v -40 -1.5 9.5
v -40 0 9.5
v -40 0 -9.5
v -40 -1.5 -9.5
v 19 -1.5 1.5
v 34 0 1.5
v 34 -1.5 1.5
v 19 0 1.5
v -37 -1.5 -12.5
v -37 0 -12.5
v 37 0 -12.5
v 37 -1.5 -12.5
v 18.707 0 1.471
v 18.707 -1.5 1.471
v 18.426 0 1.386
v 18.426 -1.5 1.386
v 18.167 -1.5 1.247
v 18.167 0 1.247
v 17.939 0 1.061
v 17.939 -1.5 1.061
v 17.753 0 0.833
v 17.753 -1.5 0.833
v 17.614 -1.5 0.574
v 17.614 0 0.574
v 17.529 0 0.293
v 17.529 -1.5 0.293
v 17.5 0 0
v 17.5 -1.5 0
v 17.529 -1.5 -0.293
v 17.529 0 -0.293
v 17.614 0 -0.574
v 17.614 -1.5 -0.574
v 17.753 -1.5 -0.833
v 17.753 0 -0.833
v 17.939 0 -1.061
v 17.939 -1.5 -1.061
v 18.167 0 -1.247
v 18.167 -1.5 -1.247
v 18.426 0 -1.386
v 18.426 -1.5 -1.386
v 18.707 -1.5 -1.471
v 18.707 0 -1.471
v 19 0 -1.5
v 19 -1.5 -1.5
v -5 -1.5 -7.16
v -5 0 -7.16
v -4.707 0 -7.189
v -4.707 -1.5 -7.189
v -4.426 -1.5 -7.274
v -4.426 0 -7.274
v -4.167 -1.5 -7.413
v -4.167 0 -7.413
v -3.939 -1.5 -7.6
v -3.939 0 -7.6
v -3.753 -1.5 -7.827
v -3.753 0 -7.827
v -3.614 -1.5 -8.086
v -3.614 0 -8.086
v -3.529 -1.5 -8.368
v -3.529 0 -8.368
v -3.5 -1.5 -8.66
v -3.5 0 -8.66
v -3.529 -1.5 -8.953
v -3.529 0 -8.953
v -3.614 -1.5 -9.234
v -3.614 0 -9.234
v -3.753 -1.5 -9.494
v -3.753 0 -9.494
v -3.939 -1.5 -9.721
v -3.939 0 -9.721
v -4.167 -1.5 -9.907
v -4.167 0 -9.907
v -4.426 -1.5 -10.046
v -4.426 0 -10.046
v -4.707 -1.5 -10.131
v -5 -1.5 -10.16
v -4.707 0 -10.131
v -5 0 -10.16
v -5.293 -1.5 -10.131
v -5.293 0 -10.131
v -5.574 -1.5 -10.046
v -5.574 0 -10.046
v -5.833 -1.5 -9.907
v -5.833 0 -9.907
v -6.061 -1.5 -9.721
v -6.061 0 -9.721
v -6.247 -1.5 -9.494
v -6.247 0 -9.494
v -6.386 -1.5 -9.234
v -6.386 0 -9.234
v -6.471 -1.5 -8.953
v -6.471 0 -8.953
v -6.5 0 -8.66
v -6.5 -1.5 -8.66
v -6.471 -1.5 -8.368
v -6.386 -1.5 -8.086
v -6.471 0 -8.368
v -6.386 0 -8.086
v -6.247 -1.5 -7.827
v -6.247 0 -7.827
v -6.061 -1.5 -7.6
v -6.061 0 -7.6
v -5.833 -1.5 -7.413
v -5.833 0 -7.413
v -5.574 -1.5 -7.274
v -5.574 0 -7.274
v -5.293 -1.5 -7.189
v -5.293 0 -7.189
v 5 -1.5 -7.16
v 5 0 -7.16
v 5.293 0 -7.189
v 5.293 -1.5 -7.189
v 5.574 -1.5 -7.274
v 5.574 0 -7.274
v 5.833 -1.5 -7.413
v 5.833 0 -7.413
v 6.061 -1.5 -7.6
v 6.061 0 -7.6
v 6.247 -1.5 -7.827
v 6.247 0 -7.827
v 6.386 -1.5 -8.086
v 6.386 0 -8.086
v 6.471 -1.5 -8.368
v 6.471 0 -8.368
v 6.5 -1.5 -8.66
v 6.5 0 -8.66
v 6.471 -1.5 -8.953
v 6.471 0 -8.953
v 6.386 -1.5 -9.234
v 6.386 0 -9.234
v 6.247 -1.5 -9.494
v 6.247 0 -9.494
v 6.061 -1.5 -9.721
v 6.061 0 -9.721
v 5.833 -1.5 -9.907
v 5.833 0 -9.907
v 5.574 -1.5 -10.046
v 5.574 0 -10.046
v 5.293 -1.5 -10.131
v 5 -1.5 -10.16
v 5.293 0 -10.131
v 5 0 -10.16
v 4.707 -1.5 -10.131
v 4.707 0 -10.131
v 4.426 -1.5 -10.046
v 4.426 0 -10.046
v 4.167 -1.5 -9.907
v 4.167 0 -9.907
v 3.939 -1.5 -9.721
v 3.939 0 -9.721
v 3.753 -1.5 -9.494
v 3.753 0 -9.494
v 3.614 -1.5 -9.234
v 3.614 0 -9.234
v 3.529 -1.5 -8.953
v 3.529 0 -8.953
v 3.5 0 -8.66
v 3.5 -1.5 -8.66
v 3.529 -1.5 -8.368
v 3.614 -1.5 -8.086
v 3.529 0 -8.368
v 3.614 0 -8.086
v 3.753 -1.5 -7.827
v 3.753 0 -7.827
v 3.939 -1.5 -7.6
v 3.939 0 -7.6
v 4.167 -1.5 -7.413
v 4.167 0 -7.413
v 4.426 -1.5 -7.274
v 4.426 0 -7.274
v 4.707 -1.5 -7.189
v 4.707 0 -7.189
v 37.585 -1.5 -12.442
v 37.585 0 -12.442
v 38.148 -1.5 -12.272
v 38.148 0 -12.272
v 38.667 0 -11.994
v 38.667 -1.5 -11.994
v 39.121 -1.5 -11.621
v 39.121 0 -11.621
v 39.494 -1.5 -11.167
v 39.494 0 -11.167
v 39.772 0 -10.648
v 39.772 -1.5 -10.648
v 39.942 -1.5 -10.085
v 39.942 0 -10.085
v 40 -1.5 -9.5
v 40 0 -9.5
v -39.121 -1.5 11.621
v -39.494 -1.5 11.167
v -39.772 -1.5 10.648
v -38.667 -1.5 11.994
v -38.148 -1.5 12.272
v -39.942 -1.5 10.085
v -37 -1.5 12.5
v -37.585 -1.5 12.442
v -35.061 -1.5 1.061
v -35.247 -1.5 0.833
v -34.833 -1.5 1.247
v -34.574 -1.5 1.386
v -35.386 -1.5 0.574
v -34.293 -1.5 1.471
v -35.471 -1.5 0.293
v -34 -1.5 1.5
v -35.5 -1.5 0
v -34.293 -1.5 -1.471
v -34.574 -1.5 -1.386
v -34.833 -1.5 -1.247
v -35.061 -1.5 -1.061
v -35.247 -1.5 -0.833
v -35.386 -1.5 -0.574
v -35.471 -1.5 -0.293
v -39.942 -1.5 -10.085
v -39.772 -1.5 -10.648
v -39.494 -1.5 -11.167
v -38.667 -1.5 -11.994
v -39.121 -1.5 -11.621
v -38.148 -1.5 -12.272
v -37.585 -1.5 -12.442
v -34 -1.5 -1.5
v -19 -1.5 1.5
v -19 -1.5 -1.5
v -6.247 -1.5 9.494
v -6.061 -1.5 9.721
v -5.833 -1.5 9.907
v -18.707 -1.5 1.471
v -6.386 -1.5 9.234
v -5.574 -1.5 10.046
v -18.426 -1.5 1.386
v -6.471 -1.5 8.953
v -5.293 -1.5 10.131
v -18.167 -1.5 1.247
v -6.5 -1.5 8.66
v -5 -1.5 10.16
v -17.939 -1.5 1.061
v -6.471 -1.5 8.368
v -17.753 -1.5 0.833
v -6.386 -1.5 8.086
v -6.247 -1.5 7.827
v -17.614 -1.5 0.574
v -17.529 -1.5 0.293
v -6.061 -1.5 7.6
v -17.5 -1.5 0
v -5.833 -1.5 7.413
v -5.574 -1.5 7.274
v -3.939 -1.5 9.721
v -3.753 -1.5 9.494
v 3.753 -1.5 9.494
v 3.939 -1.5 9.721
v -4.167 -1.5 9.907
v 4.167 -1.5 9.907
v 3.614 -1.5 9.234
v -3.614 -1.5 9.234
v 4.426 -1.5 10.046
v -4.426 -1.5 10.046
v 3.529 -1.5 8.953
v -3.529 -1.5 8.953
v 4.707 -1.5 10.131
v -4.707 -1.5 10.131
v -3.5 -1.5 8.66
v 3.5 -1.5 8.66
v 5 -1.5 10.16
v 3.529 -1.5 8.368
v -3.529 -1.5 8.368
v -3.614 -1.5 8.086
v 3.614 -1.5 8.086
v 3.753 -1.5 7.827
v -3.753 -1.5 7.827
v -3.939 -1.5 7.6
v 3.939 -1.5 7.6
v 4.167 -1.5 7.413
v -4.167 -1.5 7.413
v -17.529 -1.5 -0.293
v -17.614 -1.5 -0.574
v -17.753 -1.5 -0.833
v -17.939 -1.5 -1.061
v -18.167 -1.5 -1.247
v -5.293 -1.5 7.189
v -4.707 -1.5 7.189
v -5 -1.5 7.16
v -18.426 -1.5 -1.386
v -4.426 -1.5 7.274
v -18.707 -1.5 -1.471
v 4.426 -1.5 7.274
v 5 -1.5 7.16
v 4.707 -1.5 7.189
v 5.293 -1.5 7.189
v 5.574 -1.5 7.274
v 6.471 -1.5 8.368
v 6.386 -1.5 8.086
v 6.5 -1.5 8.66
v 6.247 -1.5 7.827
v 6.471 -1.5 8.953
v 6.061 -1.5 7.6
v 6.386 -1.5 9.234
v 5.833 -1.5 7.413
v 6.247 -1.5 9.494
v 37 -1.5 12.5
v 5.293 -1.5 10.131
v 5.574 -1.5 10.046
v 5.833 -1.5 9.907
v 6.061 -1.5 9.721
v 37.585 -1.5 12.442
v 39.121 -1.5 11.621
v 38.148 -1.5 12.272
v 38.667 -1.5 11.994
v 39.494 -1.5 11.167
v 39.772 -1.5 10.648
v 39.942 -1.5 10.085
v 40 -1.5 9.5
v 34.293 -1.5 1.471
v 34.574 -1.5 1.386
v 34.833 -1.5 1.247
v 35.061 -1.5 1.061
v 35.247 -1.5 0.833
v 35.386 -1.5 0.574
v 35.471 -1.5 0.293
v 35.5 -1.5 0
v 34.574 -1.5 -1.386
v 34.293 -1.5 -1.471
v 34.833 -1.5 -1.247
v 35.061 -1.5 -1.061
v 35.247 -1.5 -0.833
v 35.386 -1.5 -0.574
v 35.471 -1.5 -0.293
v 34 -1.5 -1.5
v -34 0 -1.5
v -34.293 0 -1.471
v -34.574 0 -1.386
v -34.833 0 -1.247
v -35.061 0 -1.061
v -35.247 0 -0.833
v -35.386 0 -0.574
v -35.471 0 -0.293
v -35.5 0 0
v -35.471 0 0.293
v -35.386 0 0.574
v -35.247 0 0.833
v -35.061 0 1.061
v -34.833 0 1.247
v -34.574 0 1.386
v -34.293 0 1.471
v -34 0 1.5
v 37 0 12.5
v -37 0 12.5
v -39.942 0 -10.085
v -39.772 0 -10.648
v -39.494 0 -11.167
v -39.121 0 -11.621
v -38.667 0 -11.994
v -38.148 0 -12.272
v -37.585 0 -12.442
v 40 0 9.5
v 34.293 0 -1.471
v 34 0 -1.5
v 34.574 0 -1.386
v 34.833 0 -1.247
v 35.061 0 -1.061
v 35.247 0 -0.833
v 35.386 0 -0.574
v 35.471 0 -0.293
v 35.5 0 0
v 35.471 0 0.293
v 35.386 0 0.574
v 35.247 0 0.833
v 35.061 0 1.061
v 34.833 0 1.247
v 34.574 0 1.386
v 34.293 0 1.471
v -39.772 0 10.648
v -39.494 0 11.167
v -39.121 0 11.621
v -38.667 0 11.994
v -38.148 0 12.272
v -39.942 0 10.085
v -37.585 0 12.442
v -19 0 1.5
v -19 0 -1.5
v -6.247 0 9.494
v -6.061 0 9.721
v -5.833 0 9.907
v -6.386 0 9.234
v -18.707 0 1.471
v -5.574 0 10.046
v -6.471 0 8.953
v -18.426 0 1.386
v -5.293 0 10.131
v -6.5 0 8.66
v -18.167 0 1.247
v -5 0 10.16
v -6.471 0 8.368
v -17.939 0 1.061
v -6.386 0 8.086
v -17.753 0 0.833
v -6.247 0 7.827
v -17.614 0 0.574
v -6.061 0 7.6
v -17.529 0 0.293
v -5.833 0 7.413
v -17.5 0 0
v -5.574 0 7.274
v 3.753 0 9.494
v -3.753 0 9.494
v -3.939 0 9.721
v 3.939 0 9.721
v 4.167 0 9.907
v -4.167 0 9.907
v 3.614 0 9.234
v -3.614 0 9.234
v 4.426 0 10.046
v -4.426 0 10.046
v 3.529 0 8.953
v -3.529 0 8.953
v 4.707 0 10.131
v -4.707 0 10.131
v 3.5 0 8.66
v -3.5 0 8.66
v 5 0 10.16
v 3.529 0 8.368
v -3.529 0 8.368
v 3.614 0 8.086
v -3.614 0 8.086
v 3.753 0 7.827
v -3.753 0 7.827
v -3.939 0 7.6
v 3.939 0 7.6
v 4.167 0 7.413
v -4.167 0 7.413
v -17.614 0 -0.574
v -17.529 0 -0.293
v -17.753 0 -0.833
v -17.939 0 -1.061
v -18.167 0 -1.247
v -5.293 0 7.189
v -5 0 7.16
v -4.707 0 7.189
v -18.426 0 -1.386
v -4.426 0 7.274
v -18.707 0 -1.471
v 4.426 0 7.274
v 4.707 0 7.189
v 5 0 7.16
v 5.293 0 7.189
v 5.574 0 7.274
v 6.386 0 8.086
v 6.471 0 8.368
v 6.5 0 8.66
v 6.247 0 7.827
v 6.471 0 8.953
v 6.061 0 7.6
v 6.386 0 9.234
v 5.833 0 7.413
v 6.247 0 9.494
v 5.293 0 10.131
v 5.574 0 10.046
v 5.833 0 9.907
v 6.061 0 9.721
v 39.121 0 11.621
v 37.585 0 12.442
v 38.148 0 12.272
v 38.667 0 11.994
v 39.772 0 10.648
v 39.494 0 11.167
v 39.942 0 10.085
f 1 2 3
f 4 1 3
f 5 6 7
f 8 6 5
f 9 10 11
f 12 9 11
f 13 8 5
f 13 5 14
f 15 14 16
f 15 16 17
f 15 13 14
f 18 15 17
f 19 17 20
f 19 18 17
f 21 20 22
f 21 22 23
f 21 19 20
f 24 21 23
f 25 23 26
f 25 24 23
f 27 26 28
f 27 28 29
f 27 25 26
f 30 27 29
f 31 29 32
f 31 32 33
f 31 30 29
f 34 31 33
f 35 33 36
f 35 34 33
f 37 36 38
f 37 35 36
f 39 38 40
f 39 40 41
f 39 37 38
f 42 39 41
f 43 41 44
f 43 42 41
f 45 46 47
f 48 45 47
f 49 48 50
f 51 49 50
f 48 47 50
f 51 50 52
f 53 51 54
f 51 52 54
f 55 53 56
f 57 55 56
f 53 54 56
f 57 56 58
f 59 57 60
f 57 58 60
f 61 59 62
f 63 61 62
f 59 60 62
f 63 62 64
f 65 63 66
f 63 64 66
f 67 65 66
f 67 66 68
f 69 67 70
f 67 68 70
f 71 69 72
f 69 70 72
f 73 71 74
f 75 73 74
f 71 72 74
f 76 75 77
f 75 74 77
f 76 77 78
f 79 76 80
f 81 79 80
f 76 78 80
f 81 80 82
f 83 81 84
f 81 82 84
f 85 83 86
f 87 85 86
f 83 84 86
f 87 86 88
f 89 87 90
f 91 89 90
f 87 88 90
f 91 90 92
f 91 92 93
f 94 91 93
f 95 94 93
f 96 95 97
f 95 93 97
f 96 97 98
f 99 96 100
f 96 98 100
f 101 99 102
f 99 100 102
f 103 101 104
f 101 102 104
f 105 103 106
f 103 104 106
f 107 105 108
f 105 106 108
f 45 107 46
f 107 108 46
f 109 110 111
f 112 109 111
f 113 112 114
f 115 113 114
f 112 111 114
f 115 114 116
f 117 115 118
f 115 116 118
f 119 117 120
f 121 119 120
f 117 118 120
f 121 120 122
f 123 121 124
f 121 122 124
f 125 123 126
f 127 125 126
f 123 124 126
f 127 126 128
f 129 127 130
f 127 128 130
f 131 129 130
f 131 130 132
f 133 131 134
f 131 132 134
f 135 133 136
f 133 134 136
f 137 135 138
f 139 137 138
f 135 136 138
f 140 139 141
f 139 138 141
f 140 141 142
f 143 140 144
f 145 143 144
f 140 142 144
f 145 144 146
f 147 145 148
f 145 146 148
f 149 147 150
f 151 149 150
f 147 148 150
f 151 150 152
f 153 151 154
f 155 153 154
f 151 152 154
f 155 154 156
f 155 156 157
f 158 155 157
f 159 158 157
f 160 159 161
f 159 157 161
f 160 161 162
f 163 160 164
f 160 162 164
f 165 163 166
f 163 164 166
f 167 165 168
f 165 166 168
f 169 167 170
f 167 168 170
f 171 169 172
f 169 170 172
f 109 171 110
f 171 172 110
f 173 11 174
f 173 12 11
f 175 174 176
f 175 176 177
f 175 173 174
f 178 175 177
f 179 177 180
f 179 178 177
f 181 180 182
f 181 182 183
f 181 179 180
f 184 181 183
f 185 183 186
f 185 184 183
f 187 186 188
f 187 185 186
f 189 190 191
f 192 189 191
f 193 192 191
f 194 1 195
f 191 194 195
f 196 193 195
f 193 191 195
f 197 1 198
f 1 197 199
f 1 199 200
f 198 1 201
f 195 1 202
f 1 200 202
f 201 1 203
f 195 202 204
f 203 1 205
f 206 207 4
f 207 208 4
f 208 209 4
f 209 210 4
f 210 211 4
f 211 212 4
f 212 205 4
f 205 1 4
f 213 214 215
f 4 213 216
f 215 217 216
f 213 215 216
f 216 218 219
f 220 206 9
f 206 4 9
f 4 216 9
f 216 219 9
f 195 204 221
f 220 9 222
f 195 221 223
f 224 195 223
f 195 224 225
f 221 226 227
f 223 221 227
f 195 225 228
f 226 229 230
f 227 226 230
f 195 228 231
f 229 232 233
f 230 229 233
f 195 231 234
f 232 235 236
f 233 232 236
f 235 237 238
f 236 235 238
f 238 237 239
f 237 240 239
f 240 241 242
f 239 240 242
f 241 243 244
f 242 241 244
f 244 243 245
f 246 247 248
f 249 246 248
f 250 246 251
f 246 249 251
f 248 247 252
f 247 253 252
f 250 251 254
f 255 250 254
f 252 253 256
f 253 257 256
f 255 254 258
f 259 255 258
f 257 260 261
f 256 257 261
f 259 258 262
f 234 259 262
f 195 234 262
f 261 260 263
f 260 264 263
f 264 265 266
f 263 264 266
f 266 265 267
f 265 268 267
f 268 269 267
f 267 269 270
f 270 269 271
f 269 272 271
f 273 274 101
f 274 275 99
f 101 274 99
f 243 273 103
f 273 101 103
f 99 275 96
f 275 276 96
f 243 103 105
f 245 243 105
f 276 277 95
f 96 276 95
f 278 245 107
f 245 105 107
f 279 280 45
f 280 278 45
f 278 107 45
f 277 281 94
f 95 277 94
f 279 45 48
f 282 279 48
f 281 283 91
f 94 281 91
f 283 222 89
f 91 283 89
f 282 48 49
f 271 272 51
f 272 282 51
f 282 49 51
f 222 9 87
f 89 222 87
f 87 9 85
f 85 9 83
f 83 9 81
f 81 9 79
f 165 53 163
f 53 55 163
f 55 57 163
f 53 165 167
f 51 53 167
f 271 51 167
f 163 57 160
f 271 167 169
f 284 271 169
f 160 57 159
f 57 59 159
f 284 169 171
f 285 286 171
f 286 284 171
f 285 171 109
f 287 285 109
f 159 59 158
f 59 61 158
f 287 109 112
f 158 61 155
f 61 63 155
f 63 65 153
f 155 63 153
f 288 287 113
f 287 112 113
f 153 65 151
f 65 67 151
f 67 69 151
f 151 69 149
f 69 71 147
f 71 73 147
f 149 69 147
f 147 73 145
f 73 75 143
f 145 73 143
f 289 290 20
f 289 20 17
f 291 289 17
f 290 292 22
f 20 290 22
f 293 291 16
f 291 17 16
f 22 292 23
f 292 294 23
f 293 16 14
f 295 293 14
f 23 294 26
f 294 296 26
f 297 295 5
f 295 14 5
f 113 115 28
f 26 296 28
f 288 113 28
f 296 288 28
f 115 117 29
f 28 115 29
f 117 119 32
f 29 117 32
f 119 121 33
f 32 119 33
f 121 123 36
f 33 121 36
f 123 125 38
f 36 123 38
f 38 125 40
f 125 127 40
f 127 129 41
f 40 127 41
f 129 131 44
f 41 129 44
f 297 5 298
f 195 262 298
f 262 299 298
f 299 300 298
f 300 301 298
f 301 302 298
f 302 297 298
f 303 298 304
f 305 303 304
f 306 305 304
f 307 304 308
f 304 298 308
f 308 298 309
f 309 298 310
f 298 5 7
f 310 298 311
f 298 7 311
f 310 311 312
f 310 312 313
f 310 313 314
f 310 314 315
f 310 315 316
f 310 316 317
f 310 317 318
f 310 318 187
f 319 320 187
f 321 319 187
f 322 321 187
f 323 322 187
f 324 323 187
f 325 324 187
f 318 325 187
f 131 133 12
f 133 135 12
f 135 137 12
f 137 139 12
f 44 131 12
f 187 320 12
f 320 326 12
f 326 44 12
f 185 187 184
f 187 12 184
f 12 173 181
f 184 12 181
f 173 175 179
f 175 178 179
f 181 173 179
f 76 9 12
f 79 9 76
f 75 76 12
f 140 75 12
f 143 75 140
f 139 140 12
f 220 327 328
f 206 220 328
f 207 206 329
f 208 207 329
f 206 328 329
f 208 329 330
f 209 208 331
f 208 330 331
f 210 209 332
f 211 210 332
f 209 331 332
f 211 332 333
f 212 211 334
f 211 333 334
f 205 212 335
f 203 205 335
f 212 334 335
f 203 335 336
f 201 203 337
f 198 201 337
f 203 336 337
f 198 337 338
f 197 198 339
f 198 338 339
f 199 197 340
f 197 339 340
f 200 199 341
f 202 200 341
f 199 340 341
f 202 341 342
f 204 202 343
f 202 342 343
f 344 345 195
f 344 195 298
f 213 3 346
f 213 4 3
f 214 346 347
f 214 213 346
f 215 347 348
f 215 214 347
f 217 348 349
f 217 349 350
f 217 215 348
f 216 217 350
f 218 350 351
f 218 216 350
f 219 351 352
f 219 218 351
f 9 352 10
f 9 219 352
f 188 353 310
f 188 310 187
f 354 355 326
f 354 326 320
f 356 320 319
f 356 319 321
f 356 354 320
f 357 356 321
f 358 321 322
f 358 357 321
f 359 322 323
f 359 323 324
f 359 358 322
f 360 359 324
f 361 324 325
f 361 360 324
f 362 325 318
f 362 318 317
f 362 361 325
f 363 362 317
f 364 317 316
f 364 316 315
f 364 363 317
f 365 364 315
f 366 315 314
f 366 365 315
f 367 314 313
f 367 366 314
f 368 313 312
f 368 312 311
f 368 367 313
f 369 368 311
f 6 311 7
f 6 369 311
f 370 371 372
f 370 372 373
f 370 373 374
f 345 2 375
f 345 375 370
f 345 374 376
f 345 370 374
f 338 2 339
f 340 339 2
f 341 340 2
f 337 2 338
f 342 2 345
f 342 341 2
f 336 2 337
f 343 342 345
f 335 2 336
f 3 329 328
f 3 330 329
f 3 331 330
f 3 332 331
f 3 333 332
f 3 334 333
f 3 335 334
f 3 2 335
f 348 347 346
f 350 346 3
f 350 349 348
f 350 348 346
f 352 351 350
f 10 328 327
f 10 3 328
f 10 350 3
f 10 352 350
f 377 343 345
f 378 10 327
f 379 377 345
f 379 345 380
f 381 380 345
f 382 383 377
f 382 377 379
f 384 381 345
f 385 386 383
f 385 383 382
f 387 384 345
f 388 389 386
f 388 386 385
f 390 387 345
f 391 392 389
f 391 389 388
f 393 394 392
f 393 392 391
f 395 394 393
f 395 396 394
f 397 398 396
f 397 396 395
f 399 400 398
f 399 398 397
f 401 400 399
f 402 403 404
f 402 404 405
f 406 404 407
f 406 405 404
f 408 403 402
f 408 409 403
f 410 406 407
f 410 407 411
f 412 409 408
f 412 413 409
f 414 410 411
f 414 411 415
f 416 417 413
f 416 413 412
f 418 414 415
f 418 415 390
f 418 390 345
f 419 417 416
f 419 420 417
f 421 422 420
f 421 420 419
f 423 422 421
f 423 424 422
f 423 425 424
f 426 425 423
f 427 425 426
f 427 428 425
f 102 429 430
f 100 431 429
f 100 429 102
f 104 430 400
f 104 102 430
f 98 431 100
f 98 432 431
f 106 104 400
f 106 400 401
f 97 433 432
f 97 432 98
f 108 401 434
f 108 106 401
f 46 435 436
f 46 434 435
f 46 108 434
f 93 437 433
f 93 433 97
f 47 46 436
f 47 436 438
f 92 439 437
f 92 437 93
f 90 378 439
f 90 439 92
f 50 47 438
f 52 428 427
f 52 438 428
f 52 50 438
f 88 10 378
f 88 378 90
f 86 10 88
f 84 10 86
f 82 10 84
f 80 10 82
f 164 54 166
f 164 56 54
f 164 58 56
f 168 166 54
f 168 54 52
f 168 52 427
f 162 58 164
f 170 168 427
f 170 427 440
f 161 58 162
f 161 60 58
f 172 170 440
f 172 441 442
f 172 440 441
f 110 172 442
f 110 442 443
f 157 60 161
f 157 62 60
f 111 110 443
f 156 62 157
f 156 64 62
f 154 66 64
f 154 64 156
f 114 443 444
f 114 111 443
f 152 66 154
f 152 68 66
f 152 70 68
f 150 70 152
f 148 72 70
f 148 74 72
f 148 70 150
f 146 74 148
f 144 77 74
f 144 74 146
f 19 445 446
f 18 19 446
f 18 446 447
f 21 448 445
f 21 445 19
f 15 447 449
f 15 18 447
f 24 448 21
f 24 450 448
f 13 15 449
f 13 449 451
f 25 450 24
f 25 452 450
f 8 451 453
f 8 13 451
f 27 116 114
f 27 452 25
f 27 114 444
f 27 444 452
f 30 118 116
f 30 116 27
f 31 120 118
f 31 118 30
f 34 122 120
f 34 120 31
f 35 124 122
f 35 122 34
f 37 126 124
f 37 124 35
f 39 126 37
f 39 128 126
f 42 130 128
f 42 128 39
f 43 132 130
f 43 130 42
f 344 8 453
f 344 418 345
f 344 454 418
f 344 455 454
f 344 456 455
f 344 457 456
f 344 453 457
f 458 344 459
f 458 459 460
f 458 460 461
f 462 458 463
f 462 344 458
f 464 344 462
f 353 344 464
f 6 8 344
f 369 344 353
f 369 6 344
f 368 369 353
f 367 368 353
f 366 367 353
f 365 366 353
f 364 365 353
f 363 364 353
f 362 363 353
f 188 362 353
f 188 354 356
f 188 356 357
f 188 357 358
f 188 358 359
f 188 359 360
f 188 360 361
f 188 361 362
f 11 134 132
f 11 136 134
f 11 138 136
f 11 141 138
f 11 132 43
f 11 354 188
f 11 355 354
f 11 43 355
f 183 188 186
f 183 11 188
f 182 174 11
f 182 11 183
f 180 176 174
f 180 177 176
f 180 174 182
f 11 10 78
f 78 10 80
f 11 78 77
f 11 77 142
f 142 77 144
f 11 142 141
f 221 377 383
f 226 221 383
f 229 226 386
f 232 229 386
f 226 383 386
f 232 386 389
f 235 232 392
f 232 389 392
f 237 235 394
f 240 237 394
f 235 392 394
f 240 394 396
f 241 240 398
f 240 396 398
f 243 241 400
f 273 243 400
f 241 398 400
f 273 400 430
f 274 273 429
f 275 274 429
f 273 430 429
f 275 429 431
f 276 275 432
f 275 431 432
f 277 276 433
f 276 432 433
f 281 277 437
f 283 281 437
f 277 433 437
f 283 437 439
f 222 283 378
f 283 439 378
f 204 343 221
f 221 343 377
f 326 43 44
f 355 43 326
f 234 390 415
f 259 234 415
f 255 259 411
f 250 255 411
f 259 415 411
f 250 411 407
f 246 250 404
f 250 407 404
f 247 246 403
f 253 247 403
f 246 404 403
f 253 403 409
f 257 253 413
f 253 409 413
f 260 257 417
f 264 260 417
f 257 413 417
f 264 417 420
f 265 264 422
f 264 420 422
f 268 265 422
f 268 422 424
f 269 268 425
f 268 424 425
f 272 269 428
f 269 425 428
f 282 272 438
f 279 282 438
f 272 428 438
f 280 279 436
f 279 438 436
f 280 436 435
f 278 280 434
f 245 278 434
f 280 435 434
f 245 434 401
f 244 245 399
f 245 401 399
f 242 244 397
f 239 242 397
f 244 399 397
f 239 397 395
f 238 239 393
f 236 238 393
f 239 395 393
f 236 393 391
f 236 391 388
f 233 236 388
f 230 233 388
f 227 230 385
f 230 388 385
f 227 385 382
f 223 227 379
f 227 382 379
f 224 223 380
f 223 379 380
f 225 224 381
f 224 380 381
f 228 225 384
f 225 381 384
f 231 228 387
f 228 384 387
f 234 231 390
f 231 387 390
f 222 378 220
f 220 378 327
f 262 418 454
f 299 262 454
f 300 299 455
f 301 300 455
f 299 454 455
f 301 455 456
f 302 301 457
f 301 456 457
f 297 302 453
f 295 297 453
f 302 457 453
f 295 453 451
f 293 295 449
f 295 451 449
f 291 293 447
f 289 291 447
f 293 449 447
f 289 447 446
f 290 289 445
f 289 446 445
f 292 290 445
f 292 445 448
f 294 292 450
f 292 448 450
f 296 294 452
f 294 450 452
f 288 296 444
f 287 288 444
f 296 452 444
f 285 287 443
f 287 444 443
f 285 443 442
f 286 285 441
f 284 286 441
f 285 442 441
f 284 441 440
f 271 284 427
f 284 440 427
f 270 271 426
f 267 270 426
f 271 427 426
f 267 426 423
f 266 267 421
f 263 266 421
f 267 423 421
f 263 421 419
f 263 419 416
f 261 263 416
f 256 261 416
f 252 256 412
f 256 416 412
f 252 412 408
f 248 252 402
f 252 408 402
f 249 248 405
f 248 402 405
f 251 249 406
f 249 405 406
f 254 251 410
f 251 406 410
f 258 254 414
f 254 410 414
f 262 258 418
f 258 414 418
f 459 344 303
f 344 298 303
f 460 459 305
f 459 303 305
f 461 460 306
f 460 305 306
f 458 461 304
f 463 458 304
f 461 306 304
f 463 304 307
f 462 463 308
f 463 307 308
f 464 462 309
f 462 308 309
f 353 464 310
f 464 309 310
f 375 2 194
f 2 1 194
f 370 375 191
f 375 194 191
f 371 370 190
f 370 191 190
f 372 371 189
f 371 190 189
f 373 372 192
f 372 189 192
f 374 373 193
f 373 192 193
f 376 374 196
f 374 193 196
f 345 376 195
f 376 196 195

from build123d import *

# Parameters (mm, degrees)
SKETCH2_W           = 80
SKETCH2_H           = 25
SKETCH2_R           = 1.5
BOSS_EXTRUDE1_DEPTH = 1.5
FILLET2_R           = 3


with BuildPart() as part:
    # Sketch2 → Boss-Extrude1 (new body)
    with BuildSketch(Plane(origin=(0, 0, 0), x_dir=(1, 0, 0), z_dir=(0, 1, 0))):
        Rectangle(SKETCH2_W, SKETCH2_H)
        with Locations(Location((5, -8.660254038, 0), (0, 0, 270))):
            Circle(SKETCH2_R, mode=Mode.SUBTRACT)
        with Locations(Location((-5, -8.660254038, 0), (0, 0, 270))):
            Circle(SKETCH2_R, mode=Mode.SUBTRACT)
        with Locations(Location((-5, 8.660254038, 0), (0, 0, 270))):
            Circle(SKETCH2_R, mode=Mode.SUBTRACT)
        with Locations(Location((5, 8.660254038, 0), (0, 0, 270))):
            Circle(SKETCH2_R, mode=Mode.SUBTRACT)
        with BuildLine():
            Line((34, -1.5), (19, -1.5))
            ThreePointArc((19, -1.5), (17.5, 0), (19, 1.5))
            Line((19, 1.5), (34, 1.5))
            ThreePointArc((34, 1.5), (35.5, 0), (34, -1.5))
        make_face(mode=Mode.SUBTRACT)
        with BuildLine():
            Line((-34, -1.5), (-19, -1.5))
            ThreePointArc((-19, -1.5), (-17.5, 0), (-19, 1.5))
            Line((-19, 1.5), (-34, 1.5))
            ThreePointArc((-34, 1.5), (-35.5, 0), (-34, -1.5))
        make_face(mode=Mode.SUBTRACT)
    extrude(amount=-BOSS_EXTRUDE1_DEPTH)

    # Fillet2
    fillet2_edges = [part.edges().sort_by_distance(p)[0] for p in [
        (40, -0.75, 12.5),
        (-40, -0.75, 12.5),
        (-40, -0.75, -12.5),
        (40, -0.75, -12.5),
    ]]
    fillet(fillet2_edges, radius=FILLET2_R)


solid = part.part
